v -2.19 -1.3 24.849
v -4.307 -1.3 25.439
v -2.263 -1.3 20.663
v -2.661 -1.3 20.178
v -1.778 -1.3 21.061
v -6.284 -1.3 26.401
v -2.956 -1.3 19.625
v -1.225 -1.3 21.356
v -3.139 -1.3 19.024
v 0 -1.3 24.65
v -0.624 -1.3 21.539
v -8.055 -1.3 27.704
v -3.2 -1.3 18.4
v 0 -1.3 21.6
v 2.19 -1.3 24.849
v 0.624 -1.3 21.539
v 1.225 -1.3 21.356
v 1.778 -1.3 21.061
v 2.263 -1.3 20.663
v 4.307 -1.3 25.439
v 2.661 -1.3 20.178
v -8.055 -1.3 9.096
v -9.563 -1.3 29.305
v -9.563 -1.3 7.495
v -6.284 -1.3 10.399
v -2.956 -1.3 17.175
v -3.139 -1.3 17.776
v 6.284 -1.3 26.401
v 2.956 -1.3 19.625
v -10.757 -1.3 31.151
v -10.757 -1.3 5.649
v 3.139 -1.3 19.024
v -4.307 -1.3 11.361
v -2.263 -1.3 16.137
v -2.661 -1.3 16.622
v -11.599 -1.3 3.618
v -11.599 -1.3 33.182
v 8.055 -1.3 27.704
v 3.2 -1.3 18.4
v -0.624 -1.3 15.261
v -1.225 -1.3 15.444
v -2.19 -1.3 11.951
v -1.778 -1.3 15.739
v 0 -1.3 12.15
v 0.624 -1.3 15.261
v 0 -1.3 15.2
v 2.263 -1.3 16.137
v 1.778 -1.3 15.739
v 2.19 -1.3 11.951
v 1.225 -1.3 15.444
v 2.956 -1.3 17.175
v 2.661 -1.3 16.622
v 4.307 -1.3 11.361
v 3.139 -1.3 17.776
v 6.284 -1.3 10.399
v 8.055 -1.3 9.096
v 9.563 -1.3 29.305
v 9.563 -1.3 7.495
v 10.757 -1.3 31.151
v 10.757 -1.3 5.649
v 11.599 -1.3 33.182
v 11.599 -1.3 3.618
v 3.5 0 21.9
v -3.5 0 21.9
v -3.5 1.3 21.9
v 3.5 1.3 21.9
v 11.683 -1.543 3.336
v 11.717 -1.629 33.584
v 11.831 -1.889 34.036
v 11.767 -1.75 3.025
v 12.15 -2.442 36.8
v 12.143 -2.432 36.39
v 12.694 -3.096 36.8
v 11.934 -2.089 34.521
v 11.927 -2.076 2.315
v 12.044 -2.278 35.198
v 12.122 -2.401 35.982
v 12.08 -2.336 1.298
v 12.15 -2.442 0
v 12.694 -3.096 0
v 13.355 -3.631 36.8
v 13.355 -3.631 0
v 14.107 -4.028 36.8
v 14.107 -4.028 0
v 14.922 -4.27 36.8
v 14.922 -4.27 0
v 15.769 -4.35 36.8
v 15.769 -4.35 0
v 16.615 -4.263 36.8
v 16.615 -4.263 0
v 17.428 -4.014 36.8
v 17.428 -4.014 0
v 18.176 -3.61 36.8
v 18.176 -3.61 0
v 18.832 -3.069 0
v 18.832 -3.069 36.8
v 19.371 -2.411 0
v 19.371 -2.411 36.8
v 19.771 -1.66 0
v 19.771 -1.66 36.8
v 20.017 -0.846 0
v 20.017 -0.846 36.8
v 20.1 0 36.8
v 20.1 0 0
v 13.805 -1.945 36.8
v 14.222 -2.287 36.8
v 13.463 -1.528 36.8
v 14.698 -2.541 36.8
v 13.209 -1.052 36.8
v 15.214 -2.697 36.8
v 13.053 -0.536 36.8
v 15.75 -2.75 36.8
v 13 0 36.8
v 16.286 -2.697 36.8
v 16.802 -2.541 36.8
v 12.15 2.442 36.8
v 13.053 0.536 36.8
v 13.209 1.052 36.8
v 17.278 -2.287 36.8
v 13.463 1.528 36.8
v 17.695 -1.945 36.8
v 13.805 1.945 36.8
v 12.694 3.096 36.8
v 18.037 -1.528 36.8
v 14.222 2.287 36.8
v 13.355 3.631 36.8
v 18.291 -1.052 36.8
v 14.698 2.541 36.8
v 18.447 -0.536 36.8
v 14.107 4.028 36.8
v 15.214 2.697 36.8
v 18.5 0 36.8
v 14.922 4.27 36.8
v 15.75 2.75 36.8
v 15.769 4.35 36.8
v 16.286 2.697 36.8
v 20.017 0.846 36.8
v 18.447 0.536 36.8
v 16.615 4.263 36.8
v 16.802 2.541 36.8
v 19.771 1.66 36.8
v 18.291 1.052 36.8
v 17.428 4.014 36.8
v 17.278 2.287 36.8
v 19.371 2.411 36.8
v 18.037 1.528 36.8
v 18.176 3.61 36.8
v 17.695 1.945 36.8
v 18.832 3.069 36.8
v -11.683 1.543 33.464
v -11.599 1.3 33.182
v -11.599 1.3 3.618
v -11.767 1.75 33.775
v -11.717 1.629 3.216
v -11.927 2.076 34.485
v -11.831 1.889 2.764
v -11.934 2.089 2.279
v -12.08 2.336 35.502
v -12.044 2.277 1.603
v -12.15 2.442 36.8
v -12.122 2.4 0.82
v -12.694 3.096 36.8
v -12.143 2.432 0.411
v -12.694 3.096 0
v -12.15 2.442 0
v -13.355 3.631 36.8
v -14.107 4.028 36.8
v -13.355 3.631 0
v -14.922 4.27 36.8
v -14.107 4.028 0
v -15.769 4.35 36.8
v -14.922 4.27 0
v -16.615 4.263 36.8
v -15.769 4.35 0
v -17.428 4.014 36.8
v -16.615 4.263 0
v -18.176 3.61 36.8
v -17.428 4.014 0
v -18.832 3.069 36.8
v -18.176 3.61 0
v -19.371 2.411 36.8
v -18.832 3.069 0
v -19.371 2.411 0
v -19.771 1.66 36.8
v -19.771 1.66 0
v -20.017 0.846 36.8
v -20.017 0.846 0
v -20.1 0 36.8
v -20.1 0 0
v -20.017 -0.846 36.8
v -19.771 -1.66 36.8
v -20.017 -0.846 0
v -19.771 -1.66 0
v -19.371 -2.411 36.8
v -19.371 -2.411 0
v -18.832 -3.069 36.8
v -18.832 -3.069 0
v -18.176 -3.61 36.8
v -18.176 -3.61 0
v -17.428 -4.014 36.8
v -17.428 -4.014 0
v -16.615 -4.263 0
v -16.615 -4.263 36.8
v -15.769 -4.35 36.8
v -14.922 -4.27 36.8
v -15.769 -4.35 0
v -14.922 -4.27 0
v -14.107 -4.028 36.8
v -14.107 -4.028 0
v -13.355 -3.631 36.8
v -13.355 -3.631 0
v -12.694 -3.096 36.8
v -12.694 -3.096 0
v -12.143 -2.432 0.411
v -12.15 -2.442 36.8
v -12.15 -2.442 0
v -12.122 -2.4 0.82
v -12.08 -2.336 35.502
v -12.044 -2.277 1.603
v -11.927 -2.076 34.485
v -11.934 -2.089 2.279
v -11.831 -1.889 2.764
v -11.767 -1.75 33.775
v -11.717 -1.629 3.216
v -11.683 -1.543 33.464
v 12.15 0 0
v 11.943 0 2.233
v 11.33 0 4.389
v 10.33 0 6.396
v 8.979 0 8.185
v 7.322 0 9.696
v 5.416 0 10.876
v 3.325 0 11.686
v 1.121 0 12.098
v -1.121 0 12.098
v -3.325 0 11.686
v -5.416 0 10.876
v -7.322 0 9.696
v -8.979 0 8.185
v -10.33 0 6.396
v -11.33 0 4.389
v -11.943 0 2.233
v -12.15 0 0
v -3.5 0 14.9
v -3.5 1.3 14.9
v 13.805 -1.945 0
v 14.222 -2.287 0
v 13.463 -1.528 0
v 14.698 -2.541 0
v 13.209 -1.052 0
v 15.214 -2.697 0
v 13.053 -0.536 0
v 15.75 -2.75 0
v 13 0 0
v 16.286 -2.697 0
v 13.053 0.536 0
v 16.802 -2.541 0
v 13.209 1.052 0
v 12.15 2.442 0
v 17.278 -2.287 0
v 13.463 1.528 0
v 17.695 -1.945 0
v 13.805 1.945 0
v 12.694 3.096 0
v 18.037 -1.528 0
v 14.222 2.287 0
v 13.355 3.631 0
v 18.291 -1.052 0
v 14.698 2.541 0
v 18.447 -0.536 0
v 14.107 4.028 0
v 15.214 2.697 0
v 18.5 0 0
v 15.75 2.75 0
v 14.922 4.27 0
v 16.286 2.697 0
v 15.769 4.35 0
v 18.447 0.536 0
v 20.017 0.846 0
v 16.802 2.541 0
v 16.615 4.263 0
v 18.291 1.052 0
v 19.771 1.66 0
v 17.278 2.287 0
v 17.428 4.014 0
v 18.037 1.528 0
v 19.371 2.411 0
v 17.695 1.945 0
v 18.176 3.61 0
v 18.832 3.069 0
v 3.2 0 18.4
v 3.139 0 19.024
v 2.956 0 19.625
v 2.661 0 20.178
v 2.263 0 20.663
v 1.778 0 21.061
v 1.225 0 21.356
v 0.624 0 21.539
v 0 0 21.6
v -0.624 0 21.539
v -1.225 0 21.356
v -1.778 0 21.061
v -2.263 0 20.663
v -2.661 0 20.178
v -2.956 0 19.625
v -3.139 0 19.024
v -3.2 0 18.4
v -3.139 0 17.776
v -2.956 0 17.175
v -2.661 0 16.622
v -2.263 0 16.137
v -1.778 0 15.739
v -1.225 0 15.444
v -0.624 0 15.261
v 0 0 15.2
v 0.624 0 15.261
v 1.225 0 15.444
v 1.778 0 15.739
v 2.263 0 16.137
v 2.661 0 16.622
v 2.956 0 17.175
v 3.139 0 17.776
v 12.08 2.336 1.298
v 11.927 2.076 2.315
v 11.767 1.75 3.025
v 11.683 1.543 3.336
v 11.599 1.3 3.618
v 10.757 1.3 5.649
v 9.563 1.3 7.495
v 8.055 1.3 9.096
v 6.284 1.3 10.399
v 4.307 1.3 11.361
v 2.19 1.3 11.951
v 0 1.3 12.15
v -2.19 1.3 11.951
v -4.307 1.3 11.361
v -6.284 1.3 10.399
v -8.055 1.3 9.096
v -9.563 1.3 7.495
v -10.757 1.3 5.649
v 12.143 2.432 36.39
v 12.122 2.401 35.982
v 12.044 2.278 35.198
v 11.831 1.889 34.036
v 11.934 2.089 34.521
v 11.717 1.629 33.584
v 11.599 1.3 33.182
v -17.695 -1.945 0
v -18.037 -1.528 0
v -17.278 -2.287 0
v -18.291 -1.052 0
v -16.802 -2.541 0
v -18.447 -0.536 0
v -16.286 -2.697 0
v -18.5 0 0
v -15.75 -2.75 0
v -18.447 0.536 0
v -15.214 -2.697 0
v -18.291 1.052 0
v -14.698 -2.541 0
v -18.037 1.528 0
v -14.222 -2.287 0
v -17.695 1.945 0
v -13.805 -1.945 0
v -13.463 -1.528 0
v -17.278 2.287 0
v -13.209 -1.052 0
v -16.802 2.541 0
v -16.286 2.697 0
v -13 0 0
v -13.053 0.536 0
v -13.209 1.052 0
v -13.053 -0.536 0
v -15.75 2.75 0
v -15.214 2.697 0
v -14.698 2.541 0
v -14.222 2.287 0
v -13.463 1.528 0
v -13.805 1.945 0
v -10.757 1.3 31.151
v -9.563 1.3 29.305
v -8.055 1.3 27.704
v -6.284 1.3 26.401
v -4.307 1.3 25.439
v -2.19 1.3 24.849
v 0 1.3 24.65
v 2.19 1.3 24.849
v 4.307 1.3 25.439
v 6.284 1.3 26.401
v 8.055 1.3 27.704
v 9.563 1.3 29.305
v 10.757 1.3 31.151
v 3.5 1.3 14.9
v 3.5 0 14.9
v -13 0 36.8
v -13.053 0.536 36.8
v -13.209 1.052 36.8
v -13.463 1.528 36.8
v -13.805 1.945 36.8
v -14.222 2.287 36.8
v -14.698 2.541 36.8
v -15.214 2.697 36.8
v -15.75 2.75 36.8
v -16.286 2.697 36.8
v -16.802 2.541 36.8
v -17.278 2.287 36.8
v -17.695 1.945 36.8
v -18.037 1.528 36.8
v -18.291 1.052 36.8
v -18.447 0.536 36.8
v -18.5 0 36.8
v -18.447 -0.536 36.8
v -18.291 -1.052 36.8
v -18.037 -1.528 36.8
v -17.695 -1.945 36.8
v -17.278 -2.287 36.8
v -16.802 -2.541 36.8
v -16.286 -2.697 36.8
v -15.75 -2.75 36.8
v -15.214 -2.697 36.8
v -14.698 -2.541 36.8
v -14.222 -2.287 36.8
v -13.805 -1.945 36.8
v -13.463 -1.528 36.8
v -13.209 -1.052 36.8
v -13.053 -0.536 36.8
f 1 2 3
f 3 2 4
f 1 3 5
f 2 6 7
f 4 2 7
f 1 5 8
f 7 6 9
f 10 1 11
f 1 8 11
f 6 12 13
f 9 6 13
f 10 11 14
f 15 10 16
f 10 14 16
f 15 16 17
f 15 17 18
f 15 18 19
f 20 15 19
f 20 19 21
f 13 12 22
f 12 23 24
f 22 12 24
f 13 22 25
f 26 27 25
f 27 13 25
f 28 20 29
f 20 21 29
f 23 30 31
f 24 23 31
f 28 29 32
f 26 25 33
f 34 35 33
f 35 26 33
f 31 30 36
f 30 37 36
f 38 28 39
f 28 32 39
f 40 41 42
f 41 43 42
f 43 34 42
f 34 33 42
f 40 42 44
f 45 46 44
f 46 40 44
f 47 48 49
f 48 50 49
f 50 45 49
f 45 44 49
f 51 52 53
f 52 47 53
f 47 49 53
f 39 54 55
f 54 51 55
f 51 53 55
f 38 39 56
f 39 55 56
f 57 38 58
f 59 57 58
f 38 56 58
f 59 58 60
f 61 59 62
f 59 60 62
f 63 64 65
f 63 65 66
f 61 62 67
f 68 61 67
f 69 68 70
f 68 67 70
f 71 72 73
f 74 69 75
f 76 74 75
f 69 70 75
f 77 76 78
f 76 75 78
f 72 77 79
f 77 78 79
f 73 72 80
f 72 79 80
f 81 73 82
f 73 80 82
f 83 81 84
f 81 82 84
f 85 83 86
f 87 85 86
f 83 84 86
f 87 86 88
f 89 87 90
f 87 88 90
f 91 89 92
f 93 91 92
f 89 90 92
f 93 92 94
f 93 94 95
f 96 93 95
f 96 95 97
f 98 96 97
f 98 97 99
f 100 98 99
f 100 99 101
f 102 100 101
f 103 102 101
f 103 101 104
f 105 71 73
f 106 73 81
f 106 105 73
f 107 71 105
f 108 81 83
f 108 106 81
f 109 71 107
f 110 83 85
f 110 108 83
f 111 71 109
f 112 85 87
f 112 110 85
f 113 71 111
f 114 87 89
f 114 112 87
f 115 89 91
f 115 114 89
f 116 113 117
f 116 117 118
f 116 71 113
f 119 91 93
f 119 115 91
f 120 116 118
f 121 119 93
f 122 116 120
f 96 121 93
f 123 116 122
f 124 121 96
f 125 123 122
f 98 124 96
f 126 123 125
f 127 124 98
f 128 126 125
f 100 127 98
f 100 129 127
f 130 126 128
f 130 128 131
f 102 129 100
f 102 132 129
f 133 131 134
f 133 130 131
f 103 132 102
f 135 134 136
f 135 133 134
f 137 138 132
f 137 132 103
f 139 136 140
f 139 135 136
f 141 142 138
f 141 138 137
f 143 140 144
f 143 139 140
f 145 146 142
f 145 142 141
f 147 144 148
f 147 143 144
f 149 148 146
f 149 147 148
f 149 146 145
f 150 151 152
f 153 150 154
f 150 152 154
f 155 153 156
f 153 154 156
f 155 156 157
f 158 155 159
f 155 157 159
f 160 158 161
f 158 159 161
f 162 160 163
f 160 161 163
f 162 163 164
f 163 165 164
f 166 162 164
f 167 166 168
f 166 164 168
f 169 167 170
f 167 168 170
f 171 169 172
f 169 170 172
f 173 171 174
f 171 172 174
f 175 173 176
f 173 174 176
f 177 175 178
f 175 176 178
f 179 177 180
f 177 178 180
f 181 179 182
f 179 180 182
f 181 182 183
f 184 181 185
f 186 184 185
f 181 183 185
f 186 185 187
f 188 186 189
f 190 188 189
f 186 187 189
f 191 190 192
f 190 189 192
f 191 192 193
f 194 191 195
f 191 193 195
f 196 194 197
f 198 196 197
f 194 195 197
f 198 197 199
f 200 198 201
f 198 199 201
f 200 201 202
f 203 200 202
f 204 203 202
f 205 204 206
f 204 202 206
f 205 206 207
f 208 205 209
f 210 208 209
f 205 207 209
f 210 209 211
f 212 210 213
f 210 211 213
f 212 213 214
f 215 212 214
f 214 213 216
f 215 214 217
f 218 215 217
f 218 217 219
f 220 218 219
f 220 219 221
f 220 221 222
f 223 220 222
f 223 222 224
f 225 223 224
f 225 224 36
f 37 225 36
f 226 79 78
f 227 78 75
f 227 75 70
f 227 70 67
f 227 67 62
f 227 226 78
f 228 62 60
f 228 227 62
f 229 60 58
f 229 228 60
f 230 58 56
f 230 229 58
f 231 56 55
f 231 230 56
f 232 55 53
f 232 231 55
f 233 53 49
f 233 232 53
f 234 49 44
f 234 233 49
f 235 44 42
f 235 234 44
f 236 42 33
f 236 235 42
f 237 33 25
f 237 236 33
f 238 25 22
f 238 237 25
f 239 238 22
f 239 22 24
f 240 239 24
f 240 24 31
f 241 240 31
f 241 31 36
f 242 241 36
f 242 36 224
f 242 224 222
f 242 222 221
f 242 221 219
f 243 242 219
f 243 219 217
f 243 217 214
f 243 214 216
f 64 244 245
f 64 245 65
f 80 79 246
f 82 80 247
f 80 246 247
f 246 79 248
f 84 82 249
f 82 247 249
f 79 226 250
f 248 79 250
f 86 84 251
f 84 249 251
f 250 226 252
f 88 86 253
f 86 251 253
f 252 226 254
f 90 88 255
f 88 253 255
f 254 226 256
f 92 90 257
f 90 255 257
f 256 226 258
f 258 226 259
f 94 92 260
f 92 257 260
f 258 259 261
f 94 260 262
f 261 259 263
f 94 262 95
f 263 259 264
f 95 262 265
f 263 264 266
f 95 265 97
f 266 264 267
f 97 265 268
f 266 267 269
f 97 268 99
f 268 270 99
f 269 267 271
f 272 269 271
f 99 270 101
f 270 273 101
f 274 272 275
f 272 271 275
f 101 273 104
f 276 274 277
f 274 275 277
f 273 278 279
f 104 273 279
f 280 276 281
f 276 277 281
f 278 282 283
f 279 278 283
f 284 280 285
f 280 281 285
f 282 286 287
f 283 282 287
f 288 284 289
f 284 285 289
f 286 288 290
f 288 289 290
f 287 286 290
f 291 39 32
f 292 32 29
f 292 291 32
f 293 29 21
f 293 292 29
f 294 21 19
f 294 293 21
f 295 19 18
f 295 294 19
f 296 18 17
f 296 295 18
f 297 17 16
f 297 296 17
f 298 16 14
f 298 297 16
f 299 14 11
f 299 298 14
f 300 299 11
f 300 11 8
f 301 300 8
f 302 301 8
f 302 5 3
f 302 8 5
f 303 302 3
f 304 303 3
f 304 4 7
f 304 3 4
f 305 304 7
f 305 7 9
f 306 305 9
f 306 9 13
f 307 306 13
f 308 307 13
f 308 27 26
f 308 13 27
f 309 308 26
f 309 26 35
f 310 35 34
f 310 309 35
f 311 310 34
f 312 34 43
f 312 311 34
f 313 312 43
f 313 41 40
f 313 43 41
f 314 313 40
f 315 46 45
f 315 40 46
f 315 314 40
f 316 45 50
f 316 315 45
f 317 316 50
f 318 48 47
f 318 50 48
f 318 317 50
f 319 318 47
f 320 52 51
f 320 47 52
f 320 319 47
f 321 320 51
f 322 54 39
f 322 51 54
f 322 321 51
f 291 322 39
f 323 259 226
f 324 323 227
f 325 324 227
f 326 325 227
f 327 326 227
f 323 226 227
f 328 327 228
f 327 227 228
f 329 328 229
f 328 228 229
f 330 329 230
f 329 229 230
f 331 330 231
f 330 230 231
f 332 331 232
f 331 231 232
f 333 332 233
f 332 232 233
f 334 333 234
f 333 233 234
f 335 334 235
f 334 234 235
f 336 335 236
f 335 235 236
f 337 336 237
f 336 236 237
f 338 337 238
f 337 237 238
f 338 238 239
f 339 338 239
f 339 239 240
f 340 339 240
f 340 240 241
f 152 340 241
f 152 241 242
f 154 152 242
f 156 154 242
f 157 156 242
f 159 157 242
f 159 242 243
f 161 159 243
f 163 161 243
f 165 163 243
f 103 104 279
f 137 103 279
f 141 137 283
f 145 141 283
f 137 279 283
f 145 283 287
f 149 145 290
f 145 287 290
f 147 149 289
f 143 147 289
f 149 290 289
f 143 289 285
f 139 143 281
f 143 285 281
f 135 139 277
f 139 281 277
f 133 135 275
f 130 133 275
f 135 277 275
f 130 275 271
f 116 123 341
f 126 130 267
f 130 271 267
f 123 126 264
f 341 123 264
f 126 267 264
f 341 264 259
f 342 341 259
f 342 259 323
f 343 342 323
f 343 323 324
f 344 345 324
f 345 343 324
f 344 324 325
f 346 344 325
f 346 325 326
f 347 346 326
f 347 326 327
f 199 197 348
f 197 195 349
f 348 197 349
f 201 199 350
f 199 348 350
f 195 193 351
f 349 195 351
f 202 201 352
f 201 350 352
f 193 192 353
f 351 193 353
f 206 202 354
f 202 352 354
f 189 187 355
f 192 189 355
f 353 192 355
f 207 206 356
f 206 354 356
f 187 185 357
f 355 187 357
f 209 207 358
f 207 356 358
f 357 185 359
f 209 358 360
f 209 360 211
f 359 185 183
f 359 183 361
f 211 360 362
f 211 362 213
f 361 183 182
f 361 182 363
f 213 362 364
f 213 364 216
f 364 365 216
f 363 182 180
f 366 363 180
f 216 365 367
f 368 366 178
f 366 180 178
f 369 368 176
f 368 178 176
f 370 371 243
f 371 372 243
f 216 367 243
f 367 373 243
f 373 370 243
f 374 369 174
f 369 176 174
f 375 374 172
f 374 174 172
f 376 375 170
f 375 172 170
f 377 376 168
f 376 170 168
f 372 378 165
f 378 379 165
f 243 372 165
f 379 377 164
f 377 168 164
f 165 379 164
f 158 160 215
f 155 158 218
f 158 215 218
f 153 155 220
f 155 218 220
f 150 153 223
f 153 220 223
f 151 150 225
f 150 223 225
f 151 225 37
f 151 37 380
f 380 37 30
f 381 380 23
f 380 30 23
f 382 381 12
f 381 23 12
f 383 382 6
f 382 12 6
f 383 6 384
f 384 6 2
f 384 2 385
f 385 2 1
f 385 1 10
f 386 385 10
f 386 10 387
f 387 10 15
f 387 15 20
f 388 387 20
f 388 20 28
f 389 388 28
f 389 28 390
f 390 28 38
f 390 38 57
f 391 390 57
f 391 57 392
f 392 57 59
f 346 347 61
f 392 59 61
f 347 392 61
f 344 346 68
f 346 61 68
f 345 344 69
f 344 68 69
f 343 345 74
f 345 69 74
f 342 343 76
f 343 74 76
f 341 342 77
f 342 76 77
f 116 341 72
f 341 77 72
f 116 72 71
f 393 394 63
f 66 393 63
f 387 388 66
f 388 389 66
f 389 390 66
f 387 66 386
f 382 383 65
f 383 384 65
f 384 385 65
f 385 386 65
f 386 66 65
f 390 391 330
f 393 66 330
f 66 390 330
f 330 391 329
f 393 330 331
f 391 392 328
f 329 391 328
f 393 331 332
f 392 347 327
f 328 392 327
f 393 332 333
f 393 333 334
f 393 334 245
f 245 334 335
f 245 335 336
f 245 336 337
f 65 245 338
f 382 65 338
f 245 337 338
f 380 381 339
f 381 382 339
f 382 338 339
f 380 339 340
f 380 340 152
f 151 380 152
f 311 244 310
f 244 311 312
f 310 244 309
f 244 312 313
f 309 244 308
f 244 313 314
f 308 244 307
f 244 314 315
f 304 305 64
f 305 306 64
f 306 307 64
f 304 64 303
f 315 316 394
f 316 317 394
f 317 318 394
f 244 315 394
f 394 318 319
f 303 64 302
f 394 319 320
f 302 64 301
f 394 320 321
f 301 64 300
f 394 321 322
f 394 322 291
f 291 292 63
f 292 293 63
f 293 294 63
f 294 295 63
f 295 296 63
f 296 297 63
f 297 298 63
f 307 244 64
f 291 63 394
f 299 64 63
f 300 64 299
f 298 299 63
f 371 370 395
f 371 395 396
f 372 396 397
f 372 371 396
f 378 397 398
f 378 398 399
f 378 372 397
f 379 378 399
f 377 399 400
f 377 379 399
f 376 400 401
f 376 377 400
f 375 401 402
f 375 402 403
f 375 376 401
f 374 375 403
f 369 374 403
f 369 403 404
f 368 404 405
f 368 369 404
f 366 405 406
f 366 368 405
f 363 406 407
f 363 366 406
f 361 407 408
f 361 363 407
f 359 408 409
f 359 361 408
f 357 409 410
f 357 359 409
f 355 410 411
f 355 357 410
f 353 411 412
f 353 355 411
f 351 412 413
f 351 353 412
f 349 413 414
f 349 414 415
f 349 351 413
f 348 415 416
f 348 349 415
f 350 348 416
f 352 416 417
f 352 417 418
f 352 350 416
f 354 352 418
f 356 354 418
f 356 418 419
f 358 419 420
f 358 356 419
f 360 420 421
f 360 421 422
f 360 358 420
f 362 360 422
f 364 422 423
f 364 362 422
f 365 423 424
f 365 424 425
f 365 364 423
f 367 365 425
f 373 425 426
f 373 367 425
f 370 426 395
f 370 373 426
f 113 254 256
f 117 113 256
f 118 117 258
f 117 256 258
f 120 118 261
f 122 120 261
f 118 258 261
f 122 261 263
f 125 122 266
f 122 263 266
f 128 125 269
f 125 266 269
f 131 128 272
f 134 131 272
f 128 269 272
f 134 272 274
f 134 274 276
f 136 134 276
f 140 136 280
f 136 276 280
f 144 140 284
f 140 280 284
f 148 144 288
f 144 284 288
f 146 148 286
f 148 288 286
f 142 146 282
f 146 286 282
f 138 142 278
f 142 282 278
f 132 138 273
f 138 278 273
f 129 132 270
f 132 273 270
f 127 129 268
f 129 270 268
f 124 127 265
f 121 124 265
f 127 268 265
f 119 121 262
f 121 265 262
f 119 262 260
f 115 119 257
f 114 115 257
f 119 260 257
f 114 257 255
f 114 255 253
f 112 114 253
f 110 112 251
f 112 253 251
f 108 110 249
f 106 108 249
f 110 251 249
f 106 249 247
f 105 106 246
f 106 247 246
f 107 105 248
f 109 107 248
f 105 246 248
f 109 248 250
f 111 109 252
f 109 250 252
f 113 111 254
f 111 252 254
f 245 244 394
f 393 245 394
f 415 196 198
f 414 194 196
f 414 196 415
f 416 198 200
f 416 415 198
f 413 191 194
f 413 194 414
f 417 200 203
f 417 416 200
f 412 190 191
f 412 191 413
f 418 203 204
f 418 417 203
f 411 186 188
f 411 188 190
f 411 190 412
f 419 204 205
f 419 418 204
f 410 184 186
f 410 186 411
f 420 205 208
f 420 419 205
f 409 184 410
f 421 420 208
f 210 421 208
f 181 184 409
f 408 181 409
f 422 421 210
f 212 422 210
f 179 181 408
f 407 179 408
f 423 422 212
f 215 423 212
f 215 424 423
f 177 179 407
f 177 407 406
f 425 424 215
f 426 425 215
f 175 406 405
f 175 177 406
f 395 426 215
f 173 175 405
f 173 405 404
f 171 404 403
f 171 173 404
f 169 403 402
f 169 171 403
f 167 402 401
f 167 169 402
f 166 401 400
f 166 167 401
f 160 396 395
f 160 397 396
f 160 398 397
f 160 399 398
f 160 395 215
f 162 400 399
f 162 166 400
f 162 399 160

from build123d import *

# Parameters (mm, degrees)
F0_R     = 2.75
F1_DEPTH = 36.8
F2_R     = 3.2
F2_R_2   = 12.15
F3_DEPTH = 12.5
F4_W     = 7
F4_H     = 7
F5_DEPTH = 25


with BuildPart() as f1:
    # F0 (on Top) → F1 (new body)
    with BuildSketch(Plane.XY):
        with BuildLine():
            ThreePointArc((-11.5987953556, -1.3), (-11.4499860347, -0.657556004), (-11.4, 0))
            ThreePointArc((-11.4, 0), (-11.4499860347, 0.657556004), (-11.5987953556, 1.3))
            Line((-11.5987953556, 1.3), (-13, 1.3))
            Line((-13, 1.3), (-13, 0))
            Line((-13, 0), (-13, -1.3))
            Line((-13, -1.3), (-11.5987953556, -1.3))
        make_face()
        with BuildLine():
            ThreePointArc((-11.5987953556, 1.3), (-11.4499860347, 0.657556004), (-11.4, 0))
            ThreePointArc((-11.4, 0), (-11.4499860347, -0.657556004), (-11.5987953556, -1.3))
            Line((-11.5987953556, -1.3), (11.5987953556, -1.3))
            ThreePointArc((11.5987953556, -1.3), (11.4, 0), (11.5987953556, 1.3))
            Line((11.5987953556, 1.3), (-11.5987953556, 1.3))
        make_face()
        with BuildLine():
            Line((-13, 1.3), (-11.5987953556, 1.3))
            ThreePointArc((-11.5987953556, 1.3), (-20.1, 0), (-11.5987953556, -1.3))
            Line((-11.5987953556, -1.3), (-13, -1.3))
            Line((-13, -1.3), (-13, 0))
            Line((-13, 0), (-13, 1.3))
        make_face()
        with Locations((-15.75, 0)):
            Circle(F0_R, mode=Mode.SUBTRACT)
        with BuildLine():
            Line((13, 1.3), (11.5987953556, 1.3))
            ThreePointArc((11.5987953556, 1.3), (11.4, 0), (11.5987953556, -1.3))
            Line((11.5987953556, -1.3), (13, -1.3))
            Line((13, -1.3), (13, 0))
            Line((13, 0), (13, 1.3))
        make_face()
        with BuildLine():
            ThreePointArc((20.1, 0), (16.407556004, 4.3000139653), (11.5987953556, 1.3))
            Line((11.5987953556, 1.3), (13, 1.3))
            Line((13, 1.3), (13, 0))
            Line((13, 0), (13, -1.3))
            Line((13, -1.3), (11.5987953556, -1.3))
            ThreePointArc((11.5987953556, -1.3), (16.407556004, -4.3000139653), (20.1, 0))
        make_face()
        with BuildLine():
            ThreePointArc((18.5, 0), (15.75, -2.75), (13, 0))
            ThreePointArc((13, 0), (15.75, 2.75), (18.5, 0))
        make_face(mode=Mode.SUBTRACT)
    extrude(amount=F1_DEPTH)

    # F2 (on Front) → F3 (cut, symmetric)
    with BuildSketch(Plane.XZ):
        with Locations((0, 18.4)):
            Circle(F2_R)
        Circle(F2_R_2)
        with Locations((0, 36.8)):
            Circle(F2_R_2)
    extrude(amount=F3_DEPTH, both=True, mode=Mode.SUBTRACT)

    # F4 (on Front) → F5 (cut)
    with BuildSketch(Plane.XZ):
        with Locations((0, 18.4)):
            Rectangle(F4_W, F4_H)
    extrude(amount=-F5_DEPTH, mode=Mode.SUBTRACT)


solid = f1.part
